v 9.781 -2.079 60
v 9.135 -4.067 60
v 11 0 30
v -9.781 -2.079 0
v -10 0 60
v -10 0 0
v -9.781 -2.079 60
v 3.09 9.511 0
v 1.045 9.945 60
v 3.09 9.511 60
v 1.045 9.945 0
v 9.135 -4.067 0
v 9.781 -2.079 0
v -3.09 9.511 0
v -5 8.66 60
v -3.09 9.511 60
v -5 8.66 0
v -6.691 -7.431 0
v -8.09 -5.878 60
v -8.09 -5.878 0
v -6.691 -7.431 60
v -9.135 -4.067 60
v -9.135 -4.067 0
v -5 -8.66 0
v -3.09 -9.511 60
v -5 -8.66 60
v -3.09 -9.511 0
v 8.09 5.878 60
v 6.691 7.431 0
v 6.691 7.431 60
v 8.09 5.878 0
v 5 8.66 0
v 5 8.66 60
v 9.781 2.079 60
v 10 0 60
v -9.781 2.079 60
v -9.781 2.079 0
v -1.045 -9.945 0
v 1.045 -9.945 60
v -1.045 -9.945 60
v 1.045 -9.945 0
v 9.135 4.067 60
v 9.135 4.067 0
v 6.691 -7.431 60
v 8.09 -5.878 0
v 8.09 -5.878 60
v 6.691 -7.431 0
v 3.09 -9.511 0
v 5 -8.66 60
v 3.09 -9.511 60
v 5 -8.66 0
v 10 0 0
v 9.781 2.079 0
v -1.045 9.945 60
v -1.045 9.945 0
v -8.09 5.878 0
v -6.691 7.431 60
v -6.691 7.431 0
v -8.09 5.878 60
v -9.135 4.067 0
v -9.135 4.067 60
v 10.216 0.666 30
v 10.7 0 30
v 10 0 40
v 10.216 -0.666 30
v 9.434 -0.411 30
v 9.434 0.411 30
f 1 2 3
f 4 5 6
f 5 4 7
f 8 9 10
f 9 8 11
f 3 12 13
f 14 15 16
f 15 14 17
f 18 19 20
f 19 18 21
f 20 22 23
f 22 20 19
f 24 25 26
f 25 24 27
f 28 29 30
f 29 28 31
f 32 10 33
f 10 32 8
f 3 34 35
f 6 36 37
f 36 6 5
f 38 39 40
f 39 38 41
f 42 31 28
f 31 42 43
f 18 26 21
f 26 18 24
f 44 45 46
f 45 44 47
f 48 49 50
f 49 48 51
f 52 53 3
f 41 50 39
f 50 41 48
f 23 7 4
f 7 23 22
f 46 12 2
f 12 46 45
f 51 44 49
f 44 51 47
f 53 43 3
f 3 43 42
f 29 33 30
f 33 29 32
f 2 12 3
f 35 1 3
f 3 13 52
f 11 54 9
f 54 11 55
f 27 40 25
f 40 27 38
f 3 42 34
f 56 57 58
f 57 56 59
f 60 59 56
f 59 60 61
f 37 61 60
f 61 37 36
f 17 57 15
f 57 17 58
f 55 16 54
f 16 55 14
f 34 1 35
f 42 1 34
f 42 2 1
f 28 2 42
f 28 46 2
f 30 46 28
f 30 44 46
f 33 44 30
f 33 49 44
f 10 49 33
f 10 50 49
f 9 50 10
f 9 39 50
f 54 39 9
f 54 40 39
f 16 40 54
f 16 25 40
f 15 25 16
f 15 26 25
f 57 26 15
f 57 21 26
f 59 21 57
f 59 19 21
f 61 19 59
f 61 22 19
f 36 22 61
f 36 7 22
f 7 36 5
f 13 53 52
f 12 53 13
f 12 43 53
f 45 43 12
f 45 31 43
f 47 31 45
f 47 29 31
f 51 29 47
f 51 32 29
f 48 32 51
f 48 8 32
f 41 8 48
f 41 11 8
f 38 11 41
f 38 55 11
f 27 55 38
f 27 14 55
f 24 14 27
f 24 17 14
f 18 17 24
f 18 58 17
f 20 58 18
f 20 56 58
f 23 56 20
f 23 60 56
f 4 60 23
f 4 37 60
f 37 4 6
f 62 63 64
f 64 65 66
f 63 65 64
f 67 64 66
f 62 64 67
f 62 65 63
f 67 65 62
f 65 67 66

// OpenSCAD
r_main = 10;
module main_cylinder() {
    difference() {
        hull() {
            cylinder(h=60,r1=10,r2=10);
            translate([r_main,0,30])
            cylinder(h=10,r1=1,r2=0);
        }   
    }
}

//cylinder(h=61,r1=7.5,r2=7.5);
//main_cylinder();


module main_with_hole() {
    difference() {
        main_cylinder(); //bloque con hull
        translate([r_main,0,30])
        cylinder(h=10,r1=0.7,r2=0);
     
    }
}

main_with_hole();
